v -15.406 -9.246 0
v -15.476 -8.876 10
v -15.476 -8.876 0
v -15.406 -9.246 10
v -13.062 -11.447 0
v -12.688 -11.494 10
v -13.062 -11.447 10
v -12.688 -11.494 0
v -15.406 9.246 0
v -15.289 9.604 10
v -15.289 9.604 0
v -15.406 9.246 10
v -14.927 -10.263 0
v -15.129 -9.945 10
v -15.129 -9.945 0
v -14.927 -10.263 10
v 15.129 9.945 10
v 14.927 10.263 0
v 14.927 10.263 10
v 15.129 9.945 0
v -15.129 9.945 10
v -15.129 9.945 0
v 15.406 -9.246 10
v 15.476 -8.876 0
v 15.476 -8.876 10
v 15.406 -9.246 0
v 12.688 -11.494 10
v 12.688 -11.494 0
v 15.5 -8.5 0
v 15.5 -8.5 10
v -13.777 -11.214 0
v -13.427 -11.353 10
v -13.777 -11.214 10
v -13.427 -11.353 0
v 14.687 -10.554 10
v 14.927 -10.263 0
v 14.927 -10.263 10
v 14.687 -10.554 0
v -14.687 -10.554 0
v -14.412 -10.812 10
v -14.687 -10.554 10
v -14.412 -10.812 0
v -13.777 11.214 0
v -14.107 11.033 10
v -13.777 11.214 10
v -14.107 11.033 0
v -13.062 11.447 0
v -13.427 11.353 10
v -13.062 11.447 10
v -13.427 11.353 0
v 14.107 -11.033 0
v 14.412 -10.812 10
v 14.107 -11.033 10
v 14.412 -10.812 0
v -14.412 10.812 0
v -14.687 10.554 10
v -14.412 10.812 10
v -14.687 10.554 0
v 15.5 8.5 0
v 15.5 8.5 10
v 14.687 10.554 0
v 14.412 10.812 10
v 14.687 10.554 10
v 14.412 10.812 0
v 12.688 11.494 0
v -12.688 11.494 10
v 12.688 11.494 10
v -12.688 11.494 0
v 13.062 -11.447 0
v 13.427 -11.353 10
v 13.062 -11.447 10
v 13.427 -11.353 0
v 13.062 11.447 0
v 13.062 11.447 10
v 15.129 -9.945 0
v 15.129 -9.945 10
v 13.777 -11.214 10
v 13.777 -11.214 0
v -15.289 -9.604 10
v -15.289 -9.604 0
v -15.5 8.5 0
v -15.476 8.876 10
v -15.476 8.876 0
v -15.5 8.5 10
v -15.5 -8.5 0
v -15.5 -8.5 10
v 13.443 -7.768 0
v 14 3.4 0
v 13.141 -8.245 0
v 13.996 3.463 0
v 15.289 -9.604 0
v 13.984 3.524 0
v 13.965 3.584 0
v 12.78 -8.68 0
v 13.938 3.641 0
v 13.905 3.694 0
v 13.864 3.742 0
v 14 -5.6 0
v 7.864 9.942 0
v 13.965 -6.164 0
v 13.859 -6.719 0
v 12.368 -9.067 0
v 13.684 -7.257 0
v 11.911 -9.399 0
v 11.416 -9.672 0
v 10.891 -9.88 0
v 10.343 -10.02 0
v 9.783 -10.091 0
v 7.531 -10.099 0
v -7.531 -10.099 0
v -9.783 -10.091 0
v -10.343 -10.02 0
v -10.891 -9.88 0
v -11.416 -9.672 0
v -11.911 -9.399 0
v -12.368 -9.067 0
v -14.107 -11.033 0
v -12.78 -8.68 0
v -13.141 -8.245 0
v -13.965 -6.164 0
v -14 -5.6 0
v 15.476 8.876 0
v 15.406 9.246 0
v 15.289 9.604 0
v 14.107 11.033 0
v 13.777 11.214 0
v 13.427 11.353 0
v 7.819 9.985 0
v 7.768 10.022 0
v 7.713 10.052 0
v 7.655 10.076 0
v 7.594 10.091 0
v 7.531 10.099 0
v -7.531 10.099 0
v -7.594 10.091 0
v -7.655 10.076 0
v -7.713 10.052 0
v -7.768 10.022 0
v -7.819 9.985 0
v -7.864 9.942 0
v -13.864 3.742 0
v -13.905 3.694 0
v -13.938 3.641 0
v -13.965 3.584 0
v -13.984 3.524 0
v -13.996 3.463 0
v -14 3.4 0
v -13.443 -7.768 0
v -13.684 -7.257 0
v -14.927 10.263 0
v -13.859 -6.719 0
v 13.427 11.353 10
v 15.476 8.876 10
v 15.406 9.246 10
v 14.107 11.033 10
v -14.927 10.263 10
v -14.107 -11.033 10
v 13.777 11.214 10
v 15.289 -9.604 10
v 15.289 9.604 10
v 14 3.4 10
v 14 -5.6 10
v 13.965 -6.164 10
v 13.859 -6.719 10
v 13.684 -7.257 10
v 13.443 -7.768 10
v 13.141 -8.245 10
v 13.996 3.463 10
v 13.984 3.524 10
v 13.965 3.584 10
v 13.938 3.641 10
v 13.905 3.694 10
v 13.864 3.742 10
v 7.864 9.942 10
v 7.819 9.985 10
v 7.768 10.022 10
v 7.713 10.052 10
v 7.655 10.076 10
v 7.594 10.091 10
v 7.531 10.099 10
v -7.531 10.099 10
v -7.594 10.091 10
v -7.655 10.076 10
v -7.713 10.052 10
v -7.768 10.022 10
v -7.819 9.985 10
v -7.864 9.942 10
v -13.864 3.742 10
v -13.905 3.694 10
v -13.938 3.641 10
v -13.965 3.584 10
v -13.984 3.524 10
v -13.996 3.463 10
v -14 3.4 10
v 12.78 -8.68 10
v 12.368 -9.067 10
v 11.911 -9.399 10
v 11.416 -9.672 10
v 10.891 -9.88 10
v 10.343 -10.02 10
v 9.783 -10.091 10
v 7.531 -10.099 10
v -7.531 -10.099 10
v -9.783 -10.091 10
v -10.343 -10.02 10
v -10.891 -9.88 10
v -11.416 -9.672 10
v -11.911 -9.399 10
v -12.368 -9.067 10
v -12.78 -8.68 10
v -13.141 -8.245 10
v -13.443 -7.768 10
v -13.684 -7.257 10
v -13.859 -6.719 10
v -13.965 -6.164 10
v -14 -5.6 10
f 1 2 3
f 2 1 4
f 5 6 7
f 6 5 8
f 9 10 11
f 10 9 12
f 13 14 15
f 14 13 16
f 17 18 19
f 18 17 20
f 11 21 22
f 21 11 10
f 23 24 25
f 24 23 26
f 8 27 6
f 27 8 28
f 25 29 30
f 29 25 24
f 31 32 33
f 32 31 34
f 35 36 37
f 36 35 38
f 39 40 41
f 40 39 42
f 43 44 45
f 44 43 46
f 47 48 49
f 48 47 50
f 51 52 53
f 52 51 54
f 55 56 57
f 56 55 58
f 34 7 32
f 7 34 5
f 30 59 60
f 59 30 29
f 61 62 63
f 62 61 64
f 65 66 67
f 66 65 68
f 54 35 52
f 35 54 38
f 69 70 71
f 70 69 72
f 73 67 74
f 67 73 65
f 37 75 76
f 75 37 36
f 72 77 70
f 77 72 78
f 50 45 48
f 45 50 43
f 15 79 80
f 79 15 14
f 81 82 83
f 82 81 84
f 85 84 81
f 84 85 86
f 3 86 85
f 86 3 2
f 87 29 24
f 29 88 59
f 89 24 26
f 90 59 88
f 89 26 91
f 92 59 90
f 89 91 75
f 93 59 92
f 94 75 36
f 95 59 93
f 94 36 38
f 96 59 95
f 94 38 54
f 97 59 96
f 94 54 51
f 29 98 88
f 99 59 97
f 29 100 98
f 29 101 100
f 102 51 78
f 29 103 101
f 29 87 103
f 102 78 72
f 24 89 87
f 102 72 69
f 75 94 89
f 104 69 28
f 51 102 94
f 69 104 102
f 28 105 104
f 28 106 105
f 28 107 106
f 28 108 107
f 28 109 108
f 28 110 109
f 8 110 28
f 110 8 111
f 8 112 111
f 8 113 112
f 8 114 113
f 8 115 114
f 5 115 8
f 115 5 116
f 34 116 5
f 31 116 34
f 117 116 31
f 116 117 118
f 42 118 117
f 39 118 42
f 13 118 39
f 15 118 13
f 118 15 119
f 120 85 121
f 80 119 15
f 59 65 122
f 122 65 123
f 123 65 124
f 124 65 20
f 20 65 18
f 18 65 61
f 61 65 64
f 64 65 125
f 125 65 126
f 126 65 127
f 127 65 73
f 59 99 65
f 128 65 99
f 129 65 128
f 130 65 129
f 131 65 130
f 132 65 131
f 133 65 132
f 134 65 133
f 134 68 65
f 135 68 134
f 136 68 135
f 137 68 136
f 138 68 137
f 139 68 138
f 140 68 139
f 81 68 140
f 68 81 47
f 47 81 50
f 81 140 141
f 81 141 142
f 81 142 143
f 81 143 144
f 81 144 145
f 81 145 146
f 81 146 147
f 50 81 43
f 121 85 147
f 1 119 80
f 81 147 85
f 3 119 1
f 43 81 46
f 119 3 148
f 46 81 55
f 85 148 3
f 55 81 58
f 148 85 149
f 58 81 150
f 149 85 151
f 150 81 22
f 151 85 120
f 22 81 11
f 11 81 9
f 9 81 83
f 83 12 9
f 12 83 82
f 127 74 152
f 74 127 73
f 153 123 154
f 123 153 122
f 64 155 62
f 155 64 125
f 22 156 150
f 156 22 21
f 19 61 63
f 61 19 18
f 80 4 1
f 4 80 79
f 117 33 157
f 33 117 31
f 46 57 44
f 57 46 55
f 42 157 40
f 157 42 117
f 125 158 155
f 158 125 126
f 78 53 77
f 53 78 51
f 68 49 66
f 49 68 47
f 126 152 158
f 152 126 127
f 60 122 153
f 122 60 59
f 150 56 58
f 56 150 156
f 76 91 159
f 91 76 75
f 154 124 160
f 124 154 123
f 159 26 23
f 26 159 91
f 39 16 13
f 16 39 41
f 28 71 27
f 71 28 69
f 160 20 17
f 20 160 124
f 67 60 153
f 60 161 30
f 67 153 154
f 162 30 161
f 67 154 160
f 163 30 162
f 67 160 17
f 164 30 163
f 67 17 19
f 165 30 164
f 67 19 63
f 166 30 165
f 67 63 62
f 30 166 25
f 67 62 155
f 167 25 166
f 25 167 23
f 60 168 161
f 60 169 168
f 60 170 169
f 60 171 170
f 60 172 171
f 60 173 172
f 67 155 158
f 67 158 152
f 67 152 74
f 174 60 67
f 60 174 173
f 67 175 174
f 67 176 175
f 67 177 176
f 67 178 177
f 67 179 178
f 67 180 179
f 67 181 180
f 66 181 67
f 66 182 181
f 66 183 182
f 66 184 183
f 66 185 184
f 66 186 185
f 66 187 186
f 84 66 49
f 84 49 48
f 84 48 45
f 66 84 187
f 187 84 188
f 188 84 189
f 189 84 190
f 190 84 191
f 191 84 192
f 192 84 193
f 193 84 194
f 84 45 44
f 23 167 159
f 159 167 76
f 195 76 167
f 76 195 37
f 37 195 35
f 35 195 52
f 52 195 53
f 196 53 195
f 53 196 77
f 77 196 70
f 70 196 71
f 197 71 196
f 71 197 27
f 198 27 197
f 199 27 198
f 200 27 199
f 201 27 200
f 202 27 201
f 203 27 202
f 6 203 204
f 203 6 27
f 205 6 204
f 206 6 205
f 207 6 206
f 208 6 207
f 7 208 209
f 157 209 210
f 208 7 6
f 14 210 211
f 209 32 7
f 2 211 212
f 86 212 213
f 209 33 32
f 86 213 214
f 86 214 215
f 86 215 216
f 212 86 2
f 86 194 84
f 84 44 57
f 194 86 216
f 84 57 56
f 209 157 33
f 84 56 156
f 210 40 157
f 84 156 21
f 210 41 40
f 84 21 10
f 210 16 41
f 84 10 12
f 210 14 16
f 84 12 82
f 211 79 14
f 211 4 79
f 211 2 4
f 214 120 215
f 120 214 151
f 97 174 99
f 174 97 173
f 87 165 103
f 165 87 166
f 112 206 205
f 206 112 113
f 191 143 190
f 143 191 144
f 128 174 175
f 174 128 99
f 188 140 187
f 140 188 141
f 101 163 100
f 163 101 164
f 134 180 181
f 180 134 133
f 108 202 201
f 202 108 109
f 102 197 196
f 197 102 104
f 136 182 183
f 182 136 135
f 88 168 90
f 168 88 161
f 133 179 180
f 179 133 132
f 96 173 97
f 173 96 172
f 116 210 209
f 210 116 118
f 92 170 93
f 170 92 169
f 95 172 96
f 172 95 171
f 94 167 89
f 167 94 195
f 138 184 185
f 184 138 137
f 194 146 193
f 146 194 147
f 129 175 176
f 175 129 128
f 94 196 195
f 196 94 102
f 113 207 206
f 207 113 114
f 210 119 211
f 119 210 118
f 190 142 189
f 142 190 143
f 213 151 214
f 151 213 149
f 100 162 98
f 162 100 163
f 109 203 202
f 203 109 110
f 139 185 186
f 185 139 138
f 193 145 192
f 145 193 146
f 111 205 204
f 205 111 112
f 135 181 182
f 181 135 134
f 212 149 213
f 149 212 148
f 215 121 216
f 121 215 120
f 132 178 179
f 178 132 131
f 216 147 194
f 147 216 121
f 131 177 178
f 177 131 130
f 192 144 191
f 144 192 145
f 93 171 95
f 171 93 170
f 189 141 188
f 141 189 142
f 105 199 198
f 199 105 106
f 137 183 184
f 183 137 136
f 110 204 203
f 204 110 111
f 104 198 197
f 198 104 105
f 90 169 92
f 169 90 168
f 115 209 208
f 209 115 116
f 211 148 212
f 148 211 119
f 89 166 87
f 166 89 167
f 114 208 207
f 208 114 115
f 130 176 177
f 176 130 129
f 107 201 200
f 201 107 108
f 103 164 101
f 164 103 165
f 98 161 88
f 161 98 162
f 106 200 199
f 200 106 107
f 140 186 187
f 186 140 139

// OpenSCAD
WIDTH = 31;
HEIGHT = 23;
DEPTH = 10;
CORNER_DIA = 6;

IEC_WIDTH_TOP = 16;
IEC_WIDTH_BOT = 28;
IEC_CORNER_DIA_TOP = 1;
IEC_CORNER_DIA_BOT = 9;
IEC_THICKNESS_BOT = 14;
IEC_THICKNESS_TOP = 20.2;

$fn = 50;

module rounded_rect(width, length, height, dia) {
  hull() {
    for(i = [-1, 1]) {
      for(j = [-1, 1]) {
        translate([i * (width - dia)/2, j * (length - dia)/2, 0])
        cylinder(d = dia, h = height);
      }
    }
  }
}

module iec() {
  hull() {
    translate([0, -(IEC_THICKNESS_TOP - IEC_THICKNESS_BOT)/2, 0]) {
      rounded_rect(IEC_WIDTH_BOT, IEC_THICKNESS_BOT, DEPTH, IEC_CORNER_DIA_BOT);
      translate([0, (IEC_THICKNESS_BOT - IEC_CORNER_DIA_TOP)/2, 0])
      rounded_rect(IEC_WIDTH_BOT, IEC_CORNER_DIA_TOP, DEPTH, IEC_CORNER_DIA_TOP);
    }
    rounded_rect(IEC_WIDTH_TOP, IEC_THICKNESS_TOP, DEPTH, IEC_CORNER_DIA_TOP);
  }
}

difference() {
  rounded_rect(WIDTH, HEIGHT, DEPTH, CORNER_DIA);

  #iec();
}
